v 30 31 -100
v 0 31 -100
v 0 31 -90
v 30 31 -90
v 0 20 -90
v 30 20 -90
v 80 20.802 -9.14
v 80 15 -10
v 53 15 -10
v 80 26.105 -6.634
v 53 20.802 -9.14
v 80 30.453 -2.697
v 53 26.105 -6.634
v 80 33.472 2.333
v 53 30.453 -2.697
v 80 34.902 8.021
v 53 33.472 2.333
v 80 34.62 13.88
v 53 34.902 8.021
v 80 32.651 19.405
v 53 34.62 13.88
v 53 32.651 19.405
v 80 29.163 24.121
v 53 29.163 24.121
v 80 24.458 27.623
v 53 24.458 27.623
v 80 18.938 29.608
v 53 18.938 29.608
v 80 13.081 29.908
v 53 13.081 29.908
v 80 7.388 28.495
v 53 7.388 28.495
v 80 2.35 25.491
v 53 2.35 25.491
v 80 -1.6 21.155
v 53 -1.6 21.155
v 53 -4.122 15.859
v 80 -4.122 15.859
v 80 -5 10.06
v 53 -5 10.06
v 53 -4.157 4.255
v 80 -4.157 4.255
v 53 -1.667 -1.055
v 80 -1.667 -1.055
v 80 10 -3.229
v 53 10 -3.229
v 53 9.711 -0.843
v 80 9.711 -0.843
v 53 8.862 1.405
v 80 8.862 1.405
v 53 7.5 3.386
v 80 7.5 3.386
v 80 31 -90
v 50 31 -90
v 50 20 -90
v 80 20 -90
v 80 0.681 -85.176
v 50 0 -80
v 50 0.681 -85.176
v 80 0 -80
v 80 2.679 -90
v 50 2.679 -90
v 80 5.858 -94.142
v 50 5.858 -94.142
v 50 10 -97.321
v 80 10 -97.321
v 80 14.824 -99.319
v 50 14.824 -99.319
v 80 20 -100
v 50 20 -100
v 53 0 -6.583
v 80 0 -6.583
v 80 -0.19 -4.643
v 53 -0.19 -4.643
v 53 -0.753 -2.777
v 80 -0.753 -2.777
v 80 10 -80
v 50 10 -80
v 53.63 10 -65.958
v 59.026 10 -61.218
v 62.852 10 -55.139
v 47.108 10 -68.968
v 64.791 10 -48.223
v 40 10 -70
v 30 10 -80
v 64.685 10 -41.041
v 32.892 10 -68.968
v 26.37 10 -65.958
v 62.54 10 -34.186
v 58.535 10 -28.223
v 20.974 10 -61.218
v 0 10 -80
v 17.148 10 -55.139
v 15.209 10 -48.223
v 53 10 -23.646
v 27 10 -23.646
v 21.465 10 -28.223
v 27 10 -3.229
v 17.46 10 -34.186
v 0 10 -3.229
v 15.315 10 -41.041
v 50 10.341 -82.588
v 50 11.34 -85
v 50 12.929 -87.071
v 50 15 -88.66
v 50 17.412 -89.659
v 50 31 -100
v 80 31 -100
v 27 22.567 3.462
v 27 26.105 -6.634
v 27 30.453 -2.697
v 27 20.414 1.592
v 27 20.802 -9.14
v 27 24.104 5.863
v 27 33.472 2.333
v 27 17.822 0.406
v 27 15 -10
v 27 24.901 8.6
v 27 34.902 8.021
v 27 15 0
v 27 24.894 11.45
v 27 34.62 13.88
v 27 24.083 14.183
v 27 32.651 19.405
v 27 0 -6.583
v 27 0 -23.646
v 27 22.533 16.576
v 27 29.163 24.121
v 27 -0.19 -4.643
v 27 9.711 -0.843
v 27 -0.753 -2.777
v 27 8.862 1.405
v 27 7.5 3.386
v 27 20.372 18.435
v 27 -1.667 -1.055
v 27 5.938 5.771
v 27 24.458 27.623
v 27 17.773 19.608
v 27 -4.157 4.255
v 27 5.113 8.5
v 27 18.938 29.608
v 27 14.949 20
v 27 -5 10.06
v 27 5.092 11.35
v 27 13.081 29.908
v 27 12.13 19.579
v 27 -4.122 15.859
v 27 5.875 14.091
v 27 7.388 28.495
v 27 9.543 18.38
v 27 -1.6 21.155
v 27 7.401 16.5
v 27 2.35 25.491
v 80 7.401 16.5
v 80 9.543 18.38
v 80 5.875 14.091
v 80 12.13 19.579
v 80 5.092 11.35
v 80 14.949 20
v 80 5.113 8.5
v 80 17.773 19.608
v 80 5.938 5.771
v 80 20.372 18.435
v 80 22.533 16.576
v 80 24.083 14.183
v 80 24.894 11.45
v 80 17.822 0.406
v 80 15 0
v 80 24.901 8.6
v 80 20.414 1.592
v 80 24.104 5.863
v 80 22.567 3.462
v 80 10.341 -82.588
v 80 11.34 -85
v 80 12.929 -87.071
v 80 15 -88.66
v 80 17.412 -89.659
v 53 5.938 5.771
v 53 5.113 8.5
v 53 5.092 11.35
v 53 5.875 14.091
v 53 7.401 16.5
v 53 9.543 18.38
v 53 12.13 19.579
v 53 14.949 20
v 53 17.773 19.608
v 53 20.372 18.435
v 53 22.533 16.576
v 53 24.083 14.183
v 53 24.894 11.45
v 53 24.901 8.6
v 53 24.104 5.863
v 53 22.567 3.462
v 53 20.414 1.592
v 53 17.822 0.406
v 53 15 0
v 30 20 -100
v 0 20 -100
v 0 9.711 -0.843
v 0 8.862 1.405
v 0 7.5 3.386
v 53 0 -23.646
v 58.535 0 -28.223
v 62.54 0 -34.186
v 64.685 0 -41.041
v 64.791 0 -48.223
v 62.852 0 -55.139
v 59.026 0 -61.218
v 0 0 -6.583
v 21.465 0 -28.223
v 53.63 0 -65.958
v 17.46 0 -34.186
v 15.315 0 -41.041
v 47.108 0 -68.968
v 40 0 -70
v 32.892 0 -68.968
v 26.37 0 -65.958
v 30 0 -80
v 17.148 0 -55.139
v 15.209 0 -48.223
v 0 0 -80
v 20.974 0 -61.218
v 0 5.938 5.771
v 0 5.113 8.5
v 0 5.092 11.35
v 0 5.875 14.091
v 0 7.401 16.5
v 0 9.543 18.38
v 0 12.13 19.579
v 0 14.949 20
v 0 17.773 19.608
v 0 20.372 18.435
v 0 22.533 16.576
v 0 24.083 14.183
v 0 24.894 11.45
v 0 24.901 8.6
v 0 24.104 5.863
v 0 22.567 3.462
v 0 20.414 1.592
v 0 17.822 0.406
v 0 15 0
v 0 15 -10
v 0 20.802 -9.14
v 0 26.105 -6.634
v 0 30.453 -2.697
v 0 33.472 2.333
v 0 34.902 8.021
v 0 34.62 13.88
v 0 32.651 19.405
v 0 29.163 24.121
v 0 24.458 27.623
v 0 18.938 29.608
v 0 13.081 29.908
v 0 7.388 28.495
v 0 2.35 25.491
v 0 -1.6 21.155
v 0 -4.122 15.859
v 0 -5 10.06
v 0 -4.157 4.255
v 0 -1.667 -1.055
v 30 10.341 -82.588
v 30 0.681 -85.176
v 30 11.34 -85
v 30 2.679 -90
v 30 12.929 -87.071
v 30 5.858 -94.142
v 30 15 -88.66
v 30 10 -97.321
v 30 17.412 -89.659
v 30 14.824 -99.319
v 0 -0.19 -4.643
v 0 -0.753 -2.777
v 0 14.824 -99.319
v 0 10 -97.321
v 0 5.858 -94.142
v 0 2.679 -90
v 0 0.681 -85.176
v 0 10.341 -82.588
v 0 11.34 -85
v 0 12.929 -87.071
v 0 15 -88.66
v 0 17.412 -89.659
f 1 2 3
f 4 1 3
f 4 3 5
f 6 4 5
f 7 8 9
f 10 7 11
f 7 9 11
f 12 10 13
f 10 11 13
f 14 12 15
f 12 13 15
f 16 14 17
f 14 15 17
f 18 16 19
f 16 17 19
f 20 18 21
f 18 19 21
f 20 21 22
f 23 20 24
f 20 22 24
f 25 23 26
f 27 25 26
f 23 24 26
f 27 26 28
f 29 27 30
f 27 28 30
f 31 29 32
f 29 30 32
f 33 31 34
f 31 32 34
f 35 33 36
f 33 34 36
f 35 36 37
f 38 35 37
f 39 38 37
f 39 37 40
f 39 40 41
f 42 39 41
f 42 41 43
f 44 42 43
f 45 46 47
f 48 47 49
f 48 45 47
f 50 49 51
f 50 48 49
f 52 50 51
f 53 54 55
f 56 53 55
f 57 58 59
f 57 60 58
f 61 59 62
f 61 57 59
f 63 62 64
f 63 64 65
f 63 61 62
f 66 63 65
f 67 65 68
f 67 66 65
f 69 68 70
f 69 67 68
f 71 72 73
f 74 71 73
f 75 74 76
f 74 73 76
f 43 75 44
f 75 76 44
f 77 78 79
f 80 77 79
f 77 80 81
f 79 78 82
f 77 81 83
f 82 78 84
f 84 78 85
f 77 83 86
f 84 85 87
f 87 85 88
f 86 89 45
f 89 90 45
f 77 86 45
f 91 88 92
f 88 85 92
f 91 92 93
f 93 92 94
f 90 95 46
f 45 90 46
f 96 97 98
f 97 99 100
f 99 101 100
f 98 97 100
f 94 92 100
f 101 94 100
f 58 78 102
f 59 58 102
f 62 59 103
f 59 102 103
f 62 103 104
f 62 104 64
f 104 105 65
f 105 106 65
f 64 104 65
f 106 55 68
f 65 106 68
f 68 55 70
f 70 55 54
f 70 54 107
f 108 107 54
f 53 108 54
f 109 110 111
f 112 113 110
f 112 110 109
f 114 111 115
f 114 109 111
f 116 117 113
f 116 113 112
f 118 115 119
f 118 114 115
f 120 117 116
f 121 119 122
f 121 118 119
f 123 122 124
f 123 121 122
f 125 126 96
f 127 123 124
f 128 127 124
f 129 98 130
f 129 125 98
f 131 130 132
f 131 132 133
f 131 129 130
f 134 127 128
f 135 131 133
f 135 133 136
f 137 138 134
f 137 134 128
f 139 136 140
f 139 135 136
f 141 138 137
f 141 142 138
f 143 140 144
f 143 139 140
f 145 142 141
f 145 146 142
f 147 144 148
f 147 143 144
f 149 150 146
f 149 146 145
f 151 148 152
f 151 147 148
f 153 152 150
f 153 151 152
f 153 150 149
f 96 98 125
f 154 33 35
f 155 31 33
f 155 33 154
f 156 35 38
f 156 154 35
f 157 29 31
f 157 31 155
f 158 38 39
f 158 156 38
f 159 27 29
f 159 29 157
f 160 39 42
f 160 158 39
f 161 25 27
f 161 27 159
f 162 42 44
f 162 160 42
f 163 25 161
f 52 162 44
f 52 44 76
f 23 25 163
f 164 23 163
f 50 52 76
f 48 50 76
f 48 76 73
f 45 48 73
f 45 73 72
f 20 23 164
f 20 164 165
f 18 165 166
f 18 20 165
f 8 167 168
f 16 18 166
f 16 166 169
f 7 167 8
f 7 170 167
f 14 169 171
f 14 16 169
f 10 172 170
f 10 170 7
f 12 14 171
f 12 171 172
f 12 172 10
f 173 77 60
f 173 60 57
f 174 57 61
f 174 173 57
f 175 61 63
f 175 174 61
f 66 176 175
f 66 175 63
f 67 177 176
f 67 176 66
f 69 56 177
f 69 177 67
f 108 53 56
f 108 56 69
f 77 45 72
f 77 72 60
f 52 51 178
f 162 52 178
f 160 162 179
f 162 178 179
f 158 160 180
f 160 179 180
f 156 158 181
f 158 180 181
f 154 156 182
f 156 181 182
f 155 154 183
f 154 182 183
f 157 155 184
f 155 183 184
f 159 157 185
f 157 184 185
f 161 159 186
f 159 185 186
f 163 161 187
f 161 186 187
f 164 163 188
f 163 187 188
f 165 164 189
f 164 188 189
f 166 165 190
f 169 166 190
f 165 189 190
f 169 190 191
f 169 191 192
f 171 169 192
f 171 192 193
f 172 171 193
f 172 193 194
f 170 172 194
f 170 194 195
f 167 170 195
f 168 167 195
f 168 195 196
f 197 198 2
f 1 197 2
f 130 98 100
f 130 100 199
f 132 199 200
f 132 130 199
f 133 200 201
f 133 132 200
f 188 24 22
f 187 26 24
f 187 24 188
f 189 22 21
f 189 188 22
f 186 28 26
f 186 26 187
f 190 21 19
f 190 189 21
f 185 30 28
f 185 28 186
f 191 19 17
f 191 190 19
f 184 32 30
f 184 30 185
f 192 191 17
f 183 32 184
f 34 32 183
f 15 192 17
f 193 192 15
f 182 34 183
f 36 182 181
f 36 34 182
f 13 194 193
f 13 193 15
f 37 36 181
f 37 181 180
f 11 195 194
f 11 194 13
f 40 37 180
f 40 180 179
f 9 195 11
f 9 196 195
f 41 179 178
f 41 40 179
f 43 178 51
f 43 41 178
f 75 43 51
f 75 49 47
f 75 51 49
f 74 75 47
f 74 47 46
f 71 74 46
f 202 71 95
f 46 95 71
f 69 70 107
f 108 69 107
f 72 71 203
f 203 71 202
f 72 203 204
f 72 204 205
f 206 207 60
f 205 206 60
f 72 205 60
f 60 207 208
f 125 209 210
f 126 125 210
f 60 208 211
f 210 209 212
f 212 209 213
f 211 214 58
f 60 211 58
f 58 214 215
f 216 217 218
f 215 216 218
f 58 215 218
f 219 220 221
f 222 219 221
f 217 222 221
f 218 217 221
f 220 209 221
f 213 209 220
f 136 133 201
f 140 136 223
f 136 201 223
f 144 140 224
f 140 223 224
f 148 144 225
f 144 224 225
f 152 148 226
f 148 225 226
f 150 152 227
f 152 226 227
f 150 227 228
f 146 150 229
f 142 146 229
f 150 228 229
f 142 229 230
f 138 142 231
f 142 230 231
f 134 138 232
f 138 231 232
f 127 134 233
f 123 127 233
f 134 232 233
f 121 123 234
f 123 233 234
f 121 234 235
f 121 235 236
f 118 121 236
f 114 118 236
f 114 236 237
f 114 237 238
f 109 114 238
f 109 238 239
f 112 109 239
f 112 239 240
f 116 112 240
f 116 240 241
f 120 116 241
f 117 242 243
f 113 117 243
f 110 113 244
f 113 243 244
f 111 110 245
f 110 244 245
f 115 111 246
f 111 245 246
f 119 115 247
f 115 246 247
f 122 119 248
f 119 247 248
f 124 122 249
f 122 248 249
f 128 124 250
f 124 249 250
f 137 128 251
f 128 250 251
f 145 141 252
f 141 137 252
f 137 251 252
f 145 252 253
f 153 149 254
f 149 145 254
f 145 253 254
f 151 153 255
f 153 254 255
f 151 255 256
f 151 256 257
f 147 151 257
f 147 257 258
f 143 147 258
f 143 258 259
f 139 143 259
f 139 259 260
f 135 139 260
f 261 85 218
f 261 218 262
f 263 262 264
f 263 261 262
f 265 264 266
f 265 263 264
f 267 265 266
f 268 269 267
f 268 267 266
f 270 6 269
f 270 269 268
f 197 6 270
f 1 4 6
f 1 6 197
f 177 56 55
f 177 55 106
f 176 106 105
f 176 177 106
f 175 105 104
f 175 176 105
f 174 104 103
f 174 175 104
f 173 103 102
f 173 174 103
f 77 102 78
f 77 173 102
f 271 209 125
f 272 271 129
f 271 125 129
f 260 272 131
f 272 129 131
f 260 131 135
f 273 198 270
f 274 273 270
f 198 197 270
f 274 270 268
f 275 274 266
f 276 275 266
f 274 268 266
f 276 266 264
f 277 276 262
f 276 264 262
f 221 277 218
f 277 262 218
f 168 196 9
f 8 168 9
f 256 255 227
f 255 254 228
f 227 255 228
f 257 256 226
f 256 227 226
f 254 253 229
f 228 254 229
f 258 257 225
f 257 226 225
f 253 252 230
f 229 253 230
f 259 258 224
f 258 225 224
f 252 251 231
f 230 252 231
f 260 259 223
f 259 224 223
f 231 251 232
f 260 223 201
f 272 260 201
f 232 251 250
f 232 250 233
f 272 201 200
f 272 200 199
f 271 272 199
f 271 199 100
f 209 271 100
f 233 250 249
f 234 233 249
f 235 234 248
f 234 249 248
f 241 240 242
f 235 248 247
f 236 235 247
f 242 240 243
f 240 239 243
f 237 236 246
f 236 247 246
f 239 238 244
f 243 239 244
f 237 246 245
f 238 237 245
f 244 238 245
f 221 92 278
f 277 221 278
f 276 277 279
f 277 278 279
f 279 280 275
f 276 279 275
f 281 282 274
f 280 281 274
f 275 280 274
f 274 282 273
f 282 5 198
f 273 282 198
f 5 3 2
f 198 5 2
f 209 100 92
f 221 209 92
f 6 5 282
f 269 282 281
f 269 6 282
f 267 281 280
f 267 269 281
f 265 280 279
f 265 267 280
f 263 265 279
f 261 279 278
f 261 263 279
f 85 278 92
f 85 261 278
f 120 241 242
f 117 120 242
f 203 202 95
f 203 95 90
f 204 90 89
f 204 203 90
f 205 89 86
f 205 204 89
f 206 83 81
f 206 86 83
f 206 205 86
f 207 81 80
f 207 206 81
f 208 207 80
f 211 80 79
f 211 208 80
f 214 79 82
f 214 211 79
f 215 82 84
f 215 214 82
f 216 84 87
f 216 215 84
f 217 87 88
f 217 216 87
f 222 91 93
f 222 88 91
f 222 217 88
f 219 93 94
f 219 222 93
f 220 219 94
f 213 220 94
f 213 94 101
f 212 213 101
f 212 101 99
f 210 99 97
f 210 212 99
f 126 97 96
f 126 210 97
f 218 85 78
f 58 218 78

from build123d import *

# Parameters (mm, degrees)
BOSS_EXTRUDE7_DEPTH = 80
FILLET1_R           = 10
FILLET2_R           = 10
SKETCH3_W           = 20
SKETCH3_H           = 28.966426772
CUT_EXTRUDE1_DEPTH  = 40
FILLET4_R           = 20


with BuildPart() as part:
    # Sketch2 → Boss-Extrude7 (new body)
    with BuildSketch(Plane(origin=(0, 0, 0), x_dir=(0, 0, -1), z_dir=(1, 0, 0))):
        with BuildLine():
            ThreePointArc((-1.339745962, 10), (-19.659258263, 17.588190451), (0, 15))
            Line((0, 15), (10, 15))
            ThreePointArc((10, 15), (-28.228756555, 23.228756555), (3.228756555, 0))
            Line((3.228756555, 0), (90, 0))
            Line((90, 0), (100, 0))
            Line((100, 0), (100, 10))
            Line((100, 10), (100, 31))
            Line((100, 31), (90, 31))
            Line((90, 31), (90, 10))
            Line((90, 10), (20, 10))
            Line((20, 10), (10, 10))
            Line((10, 10), (-1.339745962, 10))
        make_face()
    extrude(amount=BOSS_EXTRUDE7_DEPTH)

    # Fillet1
    fillet1_edges = [part.edges().sort_by_distance(p)[0] for p in [
        (40, 10, -90),
    ]]
    fillet(fillet1_edges, radius=FILLET1_R)

    # Fillet2
    fillet2_edges = [part.edges().sort_by_distance(p)[0] for p in [
        (40, 10, 1.339745962),
        (40, 0, -3.228756555),
    ]]
    fillet(fillet2_edges, radius=FILLET2_R)

    # Sketch3 → Cut-Extrude1 (cut, symmetric)
    with BuildSketch(Plane(origin=(0, 0, 0), x_dir=(1, 0, 0), z_dir=(0, 1, 0))):
        with BuildLine():
            Line((53, 10), (53, 23.645843496))
            ThreePointArc((53, 23.645843496), (40, 70), (27, 23.645843496))
            Line((27, 23.645843496), (27, 10))
            Line((27, 10), (27, -31.662975448))
            Line((27, -31.662975448), (53, -31.662975448))
            Line((53, -31.662975448), (53, 10))
        make_face()
        with Locations((40, 94.483213386)):
            Rectangle(SKETCH3_W, SKETCH3_H)
    extrude(amount=CUT_EXTRUDE1_DEPTH, both=True, mode=Mode.SUBTRACT)

    # Fillet4
    fillet4_edges = [part.edges().sort_by_distance(p)[0] for p in [
        (15, 0, -100),
        (65, 0, -100),
    ]]
    fillet(fillet4_edges, radius=FILLET4_R)


solid = part.part
